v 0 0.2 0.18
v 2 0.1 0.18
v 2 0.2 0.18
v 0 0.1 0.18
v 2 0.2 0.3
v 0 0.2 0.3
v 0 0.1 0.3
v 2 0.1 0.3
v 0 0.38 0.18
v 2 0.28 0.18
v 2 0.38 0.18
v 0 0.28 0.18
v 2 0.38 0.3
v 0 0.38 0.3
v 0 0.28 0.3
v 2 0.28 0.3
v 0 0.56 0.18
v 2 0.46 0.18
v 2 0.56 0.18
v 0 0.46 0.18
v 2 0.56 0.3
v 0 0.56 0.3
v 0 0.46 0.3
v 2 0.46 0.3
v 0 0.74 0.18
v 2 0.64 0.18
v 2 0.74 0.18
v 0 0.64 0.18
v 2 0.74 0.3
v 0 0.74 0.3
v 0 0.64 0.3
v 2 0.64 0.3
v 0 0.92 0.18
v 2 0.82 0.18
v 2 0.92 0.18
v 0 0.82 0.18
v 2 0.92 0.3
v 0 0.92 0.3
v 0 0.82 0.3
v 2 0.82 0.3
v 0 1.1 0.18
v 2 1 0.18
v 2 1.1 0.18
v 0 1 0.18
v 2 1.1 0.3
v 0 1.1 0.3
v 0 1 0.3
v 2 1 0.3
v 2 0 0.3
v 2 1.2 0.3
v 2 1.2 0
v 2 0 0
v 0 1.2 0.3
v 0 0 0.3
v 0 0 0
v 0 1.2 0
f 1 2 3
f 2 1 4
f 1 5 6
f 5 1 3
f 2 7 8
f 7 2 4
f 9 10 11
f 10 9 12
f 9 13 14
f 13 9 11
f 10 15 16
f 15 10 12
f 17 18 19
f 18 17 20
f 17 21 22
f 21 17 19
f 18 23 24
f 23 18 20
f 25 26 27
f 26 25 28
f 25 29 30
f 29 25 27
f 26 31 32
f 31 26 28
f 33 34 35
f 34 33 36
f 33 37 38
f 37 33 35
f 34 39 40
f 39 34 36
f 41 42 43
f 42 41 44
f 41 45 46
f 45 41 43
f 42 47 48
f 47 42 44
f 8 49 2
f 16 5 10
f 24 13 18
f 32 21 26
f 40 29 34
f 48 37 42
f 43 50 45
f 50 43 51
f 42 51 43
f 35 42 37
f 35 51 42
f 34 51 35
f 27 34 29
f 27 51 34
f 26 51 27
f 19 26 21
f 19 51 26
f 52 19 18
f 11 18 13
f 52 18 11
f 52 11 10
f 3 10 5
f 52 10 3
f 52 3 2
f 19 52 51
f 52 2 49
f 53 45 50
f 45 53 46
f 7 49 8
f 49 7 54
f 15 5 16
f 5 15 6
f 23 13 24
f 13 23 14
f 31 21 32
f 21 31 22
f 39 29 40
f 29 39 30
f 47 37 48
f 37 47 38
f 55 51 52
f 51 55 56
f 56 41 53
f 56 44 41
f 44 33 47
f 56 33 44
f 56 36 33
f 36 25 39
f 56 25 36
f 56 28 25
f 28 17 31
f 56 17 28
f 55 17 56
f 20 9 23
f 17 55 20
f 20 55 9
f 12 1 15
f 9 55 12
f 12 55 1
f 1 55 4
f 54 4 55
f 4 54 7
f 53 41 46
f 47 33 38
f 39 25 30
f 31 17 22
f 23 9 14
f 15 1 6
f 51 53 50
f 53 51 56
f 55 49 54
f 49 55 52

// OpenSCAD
// FR : géométrie illustrative, unités mm, fonction non validée.
// EN: illustrative geometry, mm units, unvalidated function.
// ES: geometría ilustrativa, unidades mm, función no validada.
scale([1, 1, 1]) {
difference() {
  cube([2, 1.2, 0.3]);
  for (i=[0:5]) translate([-0.01, 0.1+i*0.18, 0.18]) cube([2.02, 0.1, 0.13]);
}
}
